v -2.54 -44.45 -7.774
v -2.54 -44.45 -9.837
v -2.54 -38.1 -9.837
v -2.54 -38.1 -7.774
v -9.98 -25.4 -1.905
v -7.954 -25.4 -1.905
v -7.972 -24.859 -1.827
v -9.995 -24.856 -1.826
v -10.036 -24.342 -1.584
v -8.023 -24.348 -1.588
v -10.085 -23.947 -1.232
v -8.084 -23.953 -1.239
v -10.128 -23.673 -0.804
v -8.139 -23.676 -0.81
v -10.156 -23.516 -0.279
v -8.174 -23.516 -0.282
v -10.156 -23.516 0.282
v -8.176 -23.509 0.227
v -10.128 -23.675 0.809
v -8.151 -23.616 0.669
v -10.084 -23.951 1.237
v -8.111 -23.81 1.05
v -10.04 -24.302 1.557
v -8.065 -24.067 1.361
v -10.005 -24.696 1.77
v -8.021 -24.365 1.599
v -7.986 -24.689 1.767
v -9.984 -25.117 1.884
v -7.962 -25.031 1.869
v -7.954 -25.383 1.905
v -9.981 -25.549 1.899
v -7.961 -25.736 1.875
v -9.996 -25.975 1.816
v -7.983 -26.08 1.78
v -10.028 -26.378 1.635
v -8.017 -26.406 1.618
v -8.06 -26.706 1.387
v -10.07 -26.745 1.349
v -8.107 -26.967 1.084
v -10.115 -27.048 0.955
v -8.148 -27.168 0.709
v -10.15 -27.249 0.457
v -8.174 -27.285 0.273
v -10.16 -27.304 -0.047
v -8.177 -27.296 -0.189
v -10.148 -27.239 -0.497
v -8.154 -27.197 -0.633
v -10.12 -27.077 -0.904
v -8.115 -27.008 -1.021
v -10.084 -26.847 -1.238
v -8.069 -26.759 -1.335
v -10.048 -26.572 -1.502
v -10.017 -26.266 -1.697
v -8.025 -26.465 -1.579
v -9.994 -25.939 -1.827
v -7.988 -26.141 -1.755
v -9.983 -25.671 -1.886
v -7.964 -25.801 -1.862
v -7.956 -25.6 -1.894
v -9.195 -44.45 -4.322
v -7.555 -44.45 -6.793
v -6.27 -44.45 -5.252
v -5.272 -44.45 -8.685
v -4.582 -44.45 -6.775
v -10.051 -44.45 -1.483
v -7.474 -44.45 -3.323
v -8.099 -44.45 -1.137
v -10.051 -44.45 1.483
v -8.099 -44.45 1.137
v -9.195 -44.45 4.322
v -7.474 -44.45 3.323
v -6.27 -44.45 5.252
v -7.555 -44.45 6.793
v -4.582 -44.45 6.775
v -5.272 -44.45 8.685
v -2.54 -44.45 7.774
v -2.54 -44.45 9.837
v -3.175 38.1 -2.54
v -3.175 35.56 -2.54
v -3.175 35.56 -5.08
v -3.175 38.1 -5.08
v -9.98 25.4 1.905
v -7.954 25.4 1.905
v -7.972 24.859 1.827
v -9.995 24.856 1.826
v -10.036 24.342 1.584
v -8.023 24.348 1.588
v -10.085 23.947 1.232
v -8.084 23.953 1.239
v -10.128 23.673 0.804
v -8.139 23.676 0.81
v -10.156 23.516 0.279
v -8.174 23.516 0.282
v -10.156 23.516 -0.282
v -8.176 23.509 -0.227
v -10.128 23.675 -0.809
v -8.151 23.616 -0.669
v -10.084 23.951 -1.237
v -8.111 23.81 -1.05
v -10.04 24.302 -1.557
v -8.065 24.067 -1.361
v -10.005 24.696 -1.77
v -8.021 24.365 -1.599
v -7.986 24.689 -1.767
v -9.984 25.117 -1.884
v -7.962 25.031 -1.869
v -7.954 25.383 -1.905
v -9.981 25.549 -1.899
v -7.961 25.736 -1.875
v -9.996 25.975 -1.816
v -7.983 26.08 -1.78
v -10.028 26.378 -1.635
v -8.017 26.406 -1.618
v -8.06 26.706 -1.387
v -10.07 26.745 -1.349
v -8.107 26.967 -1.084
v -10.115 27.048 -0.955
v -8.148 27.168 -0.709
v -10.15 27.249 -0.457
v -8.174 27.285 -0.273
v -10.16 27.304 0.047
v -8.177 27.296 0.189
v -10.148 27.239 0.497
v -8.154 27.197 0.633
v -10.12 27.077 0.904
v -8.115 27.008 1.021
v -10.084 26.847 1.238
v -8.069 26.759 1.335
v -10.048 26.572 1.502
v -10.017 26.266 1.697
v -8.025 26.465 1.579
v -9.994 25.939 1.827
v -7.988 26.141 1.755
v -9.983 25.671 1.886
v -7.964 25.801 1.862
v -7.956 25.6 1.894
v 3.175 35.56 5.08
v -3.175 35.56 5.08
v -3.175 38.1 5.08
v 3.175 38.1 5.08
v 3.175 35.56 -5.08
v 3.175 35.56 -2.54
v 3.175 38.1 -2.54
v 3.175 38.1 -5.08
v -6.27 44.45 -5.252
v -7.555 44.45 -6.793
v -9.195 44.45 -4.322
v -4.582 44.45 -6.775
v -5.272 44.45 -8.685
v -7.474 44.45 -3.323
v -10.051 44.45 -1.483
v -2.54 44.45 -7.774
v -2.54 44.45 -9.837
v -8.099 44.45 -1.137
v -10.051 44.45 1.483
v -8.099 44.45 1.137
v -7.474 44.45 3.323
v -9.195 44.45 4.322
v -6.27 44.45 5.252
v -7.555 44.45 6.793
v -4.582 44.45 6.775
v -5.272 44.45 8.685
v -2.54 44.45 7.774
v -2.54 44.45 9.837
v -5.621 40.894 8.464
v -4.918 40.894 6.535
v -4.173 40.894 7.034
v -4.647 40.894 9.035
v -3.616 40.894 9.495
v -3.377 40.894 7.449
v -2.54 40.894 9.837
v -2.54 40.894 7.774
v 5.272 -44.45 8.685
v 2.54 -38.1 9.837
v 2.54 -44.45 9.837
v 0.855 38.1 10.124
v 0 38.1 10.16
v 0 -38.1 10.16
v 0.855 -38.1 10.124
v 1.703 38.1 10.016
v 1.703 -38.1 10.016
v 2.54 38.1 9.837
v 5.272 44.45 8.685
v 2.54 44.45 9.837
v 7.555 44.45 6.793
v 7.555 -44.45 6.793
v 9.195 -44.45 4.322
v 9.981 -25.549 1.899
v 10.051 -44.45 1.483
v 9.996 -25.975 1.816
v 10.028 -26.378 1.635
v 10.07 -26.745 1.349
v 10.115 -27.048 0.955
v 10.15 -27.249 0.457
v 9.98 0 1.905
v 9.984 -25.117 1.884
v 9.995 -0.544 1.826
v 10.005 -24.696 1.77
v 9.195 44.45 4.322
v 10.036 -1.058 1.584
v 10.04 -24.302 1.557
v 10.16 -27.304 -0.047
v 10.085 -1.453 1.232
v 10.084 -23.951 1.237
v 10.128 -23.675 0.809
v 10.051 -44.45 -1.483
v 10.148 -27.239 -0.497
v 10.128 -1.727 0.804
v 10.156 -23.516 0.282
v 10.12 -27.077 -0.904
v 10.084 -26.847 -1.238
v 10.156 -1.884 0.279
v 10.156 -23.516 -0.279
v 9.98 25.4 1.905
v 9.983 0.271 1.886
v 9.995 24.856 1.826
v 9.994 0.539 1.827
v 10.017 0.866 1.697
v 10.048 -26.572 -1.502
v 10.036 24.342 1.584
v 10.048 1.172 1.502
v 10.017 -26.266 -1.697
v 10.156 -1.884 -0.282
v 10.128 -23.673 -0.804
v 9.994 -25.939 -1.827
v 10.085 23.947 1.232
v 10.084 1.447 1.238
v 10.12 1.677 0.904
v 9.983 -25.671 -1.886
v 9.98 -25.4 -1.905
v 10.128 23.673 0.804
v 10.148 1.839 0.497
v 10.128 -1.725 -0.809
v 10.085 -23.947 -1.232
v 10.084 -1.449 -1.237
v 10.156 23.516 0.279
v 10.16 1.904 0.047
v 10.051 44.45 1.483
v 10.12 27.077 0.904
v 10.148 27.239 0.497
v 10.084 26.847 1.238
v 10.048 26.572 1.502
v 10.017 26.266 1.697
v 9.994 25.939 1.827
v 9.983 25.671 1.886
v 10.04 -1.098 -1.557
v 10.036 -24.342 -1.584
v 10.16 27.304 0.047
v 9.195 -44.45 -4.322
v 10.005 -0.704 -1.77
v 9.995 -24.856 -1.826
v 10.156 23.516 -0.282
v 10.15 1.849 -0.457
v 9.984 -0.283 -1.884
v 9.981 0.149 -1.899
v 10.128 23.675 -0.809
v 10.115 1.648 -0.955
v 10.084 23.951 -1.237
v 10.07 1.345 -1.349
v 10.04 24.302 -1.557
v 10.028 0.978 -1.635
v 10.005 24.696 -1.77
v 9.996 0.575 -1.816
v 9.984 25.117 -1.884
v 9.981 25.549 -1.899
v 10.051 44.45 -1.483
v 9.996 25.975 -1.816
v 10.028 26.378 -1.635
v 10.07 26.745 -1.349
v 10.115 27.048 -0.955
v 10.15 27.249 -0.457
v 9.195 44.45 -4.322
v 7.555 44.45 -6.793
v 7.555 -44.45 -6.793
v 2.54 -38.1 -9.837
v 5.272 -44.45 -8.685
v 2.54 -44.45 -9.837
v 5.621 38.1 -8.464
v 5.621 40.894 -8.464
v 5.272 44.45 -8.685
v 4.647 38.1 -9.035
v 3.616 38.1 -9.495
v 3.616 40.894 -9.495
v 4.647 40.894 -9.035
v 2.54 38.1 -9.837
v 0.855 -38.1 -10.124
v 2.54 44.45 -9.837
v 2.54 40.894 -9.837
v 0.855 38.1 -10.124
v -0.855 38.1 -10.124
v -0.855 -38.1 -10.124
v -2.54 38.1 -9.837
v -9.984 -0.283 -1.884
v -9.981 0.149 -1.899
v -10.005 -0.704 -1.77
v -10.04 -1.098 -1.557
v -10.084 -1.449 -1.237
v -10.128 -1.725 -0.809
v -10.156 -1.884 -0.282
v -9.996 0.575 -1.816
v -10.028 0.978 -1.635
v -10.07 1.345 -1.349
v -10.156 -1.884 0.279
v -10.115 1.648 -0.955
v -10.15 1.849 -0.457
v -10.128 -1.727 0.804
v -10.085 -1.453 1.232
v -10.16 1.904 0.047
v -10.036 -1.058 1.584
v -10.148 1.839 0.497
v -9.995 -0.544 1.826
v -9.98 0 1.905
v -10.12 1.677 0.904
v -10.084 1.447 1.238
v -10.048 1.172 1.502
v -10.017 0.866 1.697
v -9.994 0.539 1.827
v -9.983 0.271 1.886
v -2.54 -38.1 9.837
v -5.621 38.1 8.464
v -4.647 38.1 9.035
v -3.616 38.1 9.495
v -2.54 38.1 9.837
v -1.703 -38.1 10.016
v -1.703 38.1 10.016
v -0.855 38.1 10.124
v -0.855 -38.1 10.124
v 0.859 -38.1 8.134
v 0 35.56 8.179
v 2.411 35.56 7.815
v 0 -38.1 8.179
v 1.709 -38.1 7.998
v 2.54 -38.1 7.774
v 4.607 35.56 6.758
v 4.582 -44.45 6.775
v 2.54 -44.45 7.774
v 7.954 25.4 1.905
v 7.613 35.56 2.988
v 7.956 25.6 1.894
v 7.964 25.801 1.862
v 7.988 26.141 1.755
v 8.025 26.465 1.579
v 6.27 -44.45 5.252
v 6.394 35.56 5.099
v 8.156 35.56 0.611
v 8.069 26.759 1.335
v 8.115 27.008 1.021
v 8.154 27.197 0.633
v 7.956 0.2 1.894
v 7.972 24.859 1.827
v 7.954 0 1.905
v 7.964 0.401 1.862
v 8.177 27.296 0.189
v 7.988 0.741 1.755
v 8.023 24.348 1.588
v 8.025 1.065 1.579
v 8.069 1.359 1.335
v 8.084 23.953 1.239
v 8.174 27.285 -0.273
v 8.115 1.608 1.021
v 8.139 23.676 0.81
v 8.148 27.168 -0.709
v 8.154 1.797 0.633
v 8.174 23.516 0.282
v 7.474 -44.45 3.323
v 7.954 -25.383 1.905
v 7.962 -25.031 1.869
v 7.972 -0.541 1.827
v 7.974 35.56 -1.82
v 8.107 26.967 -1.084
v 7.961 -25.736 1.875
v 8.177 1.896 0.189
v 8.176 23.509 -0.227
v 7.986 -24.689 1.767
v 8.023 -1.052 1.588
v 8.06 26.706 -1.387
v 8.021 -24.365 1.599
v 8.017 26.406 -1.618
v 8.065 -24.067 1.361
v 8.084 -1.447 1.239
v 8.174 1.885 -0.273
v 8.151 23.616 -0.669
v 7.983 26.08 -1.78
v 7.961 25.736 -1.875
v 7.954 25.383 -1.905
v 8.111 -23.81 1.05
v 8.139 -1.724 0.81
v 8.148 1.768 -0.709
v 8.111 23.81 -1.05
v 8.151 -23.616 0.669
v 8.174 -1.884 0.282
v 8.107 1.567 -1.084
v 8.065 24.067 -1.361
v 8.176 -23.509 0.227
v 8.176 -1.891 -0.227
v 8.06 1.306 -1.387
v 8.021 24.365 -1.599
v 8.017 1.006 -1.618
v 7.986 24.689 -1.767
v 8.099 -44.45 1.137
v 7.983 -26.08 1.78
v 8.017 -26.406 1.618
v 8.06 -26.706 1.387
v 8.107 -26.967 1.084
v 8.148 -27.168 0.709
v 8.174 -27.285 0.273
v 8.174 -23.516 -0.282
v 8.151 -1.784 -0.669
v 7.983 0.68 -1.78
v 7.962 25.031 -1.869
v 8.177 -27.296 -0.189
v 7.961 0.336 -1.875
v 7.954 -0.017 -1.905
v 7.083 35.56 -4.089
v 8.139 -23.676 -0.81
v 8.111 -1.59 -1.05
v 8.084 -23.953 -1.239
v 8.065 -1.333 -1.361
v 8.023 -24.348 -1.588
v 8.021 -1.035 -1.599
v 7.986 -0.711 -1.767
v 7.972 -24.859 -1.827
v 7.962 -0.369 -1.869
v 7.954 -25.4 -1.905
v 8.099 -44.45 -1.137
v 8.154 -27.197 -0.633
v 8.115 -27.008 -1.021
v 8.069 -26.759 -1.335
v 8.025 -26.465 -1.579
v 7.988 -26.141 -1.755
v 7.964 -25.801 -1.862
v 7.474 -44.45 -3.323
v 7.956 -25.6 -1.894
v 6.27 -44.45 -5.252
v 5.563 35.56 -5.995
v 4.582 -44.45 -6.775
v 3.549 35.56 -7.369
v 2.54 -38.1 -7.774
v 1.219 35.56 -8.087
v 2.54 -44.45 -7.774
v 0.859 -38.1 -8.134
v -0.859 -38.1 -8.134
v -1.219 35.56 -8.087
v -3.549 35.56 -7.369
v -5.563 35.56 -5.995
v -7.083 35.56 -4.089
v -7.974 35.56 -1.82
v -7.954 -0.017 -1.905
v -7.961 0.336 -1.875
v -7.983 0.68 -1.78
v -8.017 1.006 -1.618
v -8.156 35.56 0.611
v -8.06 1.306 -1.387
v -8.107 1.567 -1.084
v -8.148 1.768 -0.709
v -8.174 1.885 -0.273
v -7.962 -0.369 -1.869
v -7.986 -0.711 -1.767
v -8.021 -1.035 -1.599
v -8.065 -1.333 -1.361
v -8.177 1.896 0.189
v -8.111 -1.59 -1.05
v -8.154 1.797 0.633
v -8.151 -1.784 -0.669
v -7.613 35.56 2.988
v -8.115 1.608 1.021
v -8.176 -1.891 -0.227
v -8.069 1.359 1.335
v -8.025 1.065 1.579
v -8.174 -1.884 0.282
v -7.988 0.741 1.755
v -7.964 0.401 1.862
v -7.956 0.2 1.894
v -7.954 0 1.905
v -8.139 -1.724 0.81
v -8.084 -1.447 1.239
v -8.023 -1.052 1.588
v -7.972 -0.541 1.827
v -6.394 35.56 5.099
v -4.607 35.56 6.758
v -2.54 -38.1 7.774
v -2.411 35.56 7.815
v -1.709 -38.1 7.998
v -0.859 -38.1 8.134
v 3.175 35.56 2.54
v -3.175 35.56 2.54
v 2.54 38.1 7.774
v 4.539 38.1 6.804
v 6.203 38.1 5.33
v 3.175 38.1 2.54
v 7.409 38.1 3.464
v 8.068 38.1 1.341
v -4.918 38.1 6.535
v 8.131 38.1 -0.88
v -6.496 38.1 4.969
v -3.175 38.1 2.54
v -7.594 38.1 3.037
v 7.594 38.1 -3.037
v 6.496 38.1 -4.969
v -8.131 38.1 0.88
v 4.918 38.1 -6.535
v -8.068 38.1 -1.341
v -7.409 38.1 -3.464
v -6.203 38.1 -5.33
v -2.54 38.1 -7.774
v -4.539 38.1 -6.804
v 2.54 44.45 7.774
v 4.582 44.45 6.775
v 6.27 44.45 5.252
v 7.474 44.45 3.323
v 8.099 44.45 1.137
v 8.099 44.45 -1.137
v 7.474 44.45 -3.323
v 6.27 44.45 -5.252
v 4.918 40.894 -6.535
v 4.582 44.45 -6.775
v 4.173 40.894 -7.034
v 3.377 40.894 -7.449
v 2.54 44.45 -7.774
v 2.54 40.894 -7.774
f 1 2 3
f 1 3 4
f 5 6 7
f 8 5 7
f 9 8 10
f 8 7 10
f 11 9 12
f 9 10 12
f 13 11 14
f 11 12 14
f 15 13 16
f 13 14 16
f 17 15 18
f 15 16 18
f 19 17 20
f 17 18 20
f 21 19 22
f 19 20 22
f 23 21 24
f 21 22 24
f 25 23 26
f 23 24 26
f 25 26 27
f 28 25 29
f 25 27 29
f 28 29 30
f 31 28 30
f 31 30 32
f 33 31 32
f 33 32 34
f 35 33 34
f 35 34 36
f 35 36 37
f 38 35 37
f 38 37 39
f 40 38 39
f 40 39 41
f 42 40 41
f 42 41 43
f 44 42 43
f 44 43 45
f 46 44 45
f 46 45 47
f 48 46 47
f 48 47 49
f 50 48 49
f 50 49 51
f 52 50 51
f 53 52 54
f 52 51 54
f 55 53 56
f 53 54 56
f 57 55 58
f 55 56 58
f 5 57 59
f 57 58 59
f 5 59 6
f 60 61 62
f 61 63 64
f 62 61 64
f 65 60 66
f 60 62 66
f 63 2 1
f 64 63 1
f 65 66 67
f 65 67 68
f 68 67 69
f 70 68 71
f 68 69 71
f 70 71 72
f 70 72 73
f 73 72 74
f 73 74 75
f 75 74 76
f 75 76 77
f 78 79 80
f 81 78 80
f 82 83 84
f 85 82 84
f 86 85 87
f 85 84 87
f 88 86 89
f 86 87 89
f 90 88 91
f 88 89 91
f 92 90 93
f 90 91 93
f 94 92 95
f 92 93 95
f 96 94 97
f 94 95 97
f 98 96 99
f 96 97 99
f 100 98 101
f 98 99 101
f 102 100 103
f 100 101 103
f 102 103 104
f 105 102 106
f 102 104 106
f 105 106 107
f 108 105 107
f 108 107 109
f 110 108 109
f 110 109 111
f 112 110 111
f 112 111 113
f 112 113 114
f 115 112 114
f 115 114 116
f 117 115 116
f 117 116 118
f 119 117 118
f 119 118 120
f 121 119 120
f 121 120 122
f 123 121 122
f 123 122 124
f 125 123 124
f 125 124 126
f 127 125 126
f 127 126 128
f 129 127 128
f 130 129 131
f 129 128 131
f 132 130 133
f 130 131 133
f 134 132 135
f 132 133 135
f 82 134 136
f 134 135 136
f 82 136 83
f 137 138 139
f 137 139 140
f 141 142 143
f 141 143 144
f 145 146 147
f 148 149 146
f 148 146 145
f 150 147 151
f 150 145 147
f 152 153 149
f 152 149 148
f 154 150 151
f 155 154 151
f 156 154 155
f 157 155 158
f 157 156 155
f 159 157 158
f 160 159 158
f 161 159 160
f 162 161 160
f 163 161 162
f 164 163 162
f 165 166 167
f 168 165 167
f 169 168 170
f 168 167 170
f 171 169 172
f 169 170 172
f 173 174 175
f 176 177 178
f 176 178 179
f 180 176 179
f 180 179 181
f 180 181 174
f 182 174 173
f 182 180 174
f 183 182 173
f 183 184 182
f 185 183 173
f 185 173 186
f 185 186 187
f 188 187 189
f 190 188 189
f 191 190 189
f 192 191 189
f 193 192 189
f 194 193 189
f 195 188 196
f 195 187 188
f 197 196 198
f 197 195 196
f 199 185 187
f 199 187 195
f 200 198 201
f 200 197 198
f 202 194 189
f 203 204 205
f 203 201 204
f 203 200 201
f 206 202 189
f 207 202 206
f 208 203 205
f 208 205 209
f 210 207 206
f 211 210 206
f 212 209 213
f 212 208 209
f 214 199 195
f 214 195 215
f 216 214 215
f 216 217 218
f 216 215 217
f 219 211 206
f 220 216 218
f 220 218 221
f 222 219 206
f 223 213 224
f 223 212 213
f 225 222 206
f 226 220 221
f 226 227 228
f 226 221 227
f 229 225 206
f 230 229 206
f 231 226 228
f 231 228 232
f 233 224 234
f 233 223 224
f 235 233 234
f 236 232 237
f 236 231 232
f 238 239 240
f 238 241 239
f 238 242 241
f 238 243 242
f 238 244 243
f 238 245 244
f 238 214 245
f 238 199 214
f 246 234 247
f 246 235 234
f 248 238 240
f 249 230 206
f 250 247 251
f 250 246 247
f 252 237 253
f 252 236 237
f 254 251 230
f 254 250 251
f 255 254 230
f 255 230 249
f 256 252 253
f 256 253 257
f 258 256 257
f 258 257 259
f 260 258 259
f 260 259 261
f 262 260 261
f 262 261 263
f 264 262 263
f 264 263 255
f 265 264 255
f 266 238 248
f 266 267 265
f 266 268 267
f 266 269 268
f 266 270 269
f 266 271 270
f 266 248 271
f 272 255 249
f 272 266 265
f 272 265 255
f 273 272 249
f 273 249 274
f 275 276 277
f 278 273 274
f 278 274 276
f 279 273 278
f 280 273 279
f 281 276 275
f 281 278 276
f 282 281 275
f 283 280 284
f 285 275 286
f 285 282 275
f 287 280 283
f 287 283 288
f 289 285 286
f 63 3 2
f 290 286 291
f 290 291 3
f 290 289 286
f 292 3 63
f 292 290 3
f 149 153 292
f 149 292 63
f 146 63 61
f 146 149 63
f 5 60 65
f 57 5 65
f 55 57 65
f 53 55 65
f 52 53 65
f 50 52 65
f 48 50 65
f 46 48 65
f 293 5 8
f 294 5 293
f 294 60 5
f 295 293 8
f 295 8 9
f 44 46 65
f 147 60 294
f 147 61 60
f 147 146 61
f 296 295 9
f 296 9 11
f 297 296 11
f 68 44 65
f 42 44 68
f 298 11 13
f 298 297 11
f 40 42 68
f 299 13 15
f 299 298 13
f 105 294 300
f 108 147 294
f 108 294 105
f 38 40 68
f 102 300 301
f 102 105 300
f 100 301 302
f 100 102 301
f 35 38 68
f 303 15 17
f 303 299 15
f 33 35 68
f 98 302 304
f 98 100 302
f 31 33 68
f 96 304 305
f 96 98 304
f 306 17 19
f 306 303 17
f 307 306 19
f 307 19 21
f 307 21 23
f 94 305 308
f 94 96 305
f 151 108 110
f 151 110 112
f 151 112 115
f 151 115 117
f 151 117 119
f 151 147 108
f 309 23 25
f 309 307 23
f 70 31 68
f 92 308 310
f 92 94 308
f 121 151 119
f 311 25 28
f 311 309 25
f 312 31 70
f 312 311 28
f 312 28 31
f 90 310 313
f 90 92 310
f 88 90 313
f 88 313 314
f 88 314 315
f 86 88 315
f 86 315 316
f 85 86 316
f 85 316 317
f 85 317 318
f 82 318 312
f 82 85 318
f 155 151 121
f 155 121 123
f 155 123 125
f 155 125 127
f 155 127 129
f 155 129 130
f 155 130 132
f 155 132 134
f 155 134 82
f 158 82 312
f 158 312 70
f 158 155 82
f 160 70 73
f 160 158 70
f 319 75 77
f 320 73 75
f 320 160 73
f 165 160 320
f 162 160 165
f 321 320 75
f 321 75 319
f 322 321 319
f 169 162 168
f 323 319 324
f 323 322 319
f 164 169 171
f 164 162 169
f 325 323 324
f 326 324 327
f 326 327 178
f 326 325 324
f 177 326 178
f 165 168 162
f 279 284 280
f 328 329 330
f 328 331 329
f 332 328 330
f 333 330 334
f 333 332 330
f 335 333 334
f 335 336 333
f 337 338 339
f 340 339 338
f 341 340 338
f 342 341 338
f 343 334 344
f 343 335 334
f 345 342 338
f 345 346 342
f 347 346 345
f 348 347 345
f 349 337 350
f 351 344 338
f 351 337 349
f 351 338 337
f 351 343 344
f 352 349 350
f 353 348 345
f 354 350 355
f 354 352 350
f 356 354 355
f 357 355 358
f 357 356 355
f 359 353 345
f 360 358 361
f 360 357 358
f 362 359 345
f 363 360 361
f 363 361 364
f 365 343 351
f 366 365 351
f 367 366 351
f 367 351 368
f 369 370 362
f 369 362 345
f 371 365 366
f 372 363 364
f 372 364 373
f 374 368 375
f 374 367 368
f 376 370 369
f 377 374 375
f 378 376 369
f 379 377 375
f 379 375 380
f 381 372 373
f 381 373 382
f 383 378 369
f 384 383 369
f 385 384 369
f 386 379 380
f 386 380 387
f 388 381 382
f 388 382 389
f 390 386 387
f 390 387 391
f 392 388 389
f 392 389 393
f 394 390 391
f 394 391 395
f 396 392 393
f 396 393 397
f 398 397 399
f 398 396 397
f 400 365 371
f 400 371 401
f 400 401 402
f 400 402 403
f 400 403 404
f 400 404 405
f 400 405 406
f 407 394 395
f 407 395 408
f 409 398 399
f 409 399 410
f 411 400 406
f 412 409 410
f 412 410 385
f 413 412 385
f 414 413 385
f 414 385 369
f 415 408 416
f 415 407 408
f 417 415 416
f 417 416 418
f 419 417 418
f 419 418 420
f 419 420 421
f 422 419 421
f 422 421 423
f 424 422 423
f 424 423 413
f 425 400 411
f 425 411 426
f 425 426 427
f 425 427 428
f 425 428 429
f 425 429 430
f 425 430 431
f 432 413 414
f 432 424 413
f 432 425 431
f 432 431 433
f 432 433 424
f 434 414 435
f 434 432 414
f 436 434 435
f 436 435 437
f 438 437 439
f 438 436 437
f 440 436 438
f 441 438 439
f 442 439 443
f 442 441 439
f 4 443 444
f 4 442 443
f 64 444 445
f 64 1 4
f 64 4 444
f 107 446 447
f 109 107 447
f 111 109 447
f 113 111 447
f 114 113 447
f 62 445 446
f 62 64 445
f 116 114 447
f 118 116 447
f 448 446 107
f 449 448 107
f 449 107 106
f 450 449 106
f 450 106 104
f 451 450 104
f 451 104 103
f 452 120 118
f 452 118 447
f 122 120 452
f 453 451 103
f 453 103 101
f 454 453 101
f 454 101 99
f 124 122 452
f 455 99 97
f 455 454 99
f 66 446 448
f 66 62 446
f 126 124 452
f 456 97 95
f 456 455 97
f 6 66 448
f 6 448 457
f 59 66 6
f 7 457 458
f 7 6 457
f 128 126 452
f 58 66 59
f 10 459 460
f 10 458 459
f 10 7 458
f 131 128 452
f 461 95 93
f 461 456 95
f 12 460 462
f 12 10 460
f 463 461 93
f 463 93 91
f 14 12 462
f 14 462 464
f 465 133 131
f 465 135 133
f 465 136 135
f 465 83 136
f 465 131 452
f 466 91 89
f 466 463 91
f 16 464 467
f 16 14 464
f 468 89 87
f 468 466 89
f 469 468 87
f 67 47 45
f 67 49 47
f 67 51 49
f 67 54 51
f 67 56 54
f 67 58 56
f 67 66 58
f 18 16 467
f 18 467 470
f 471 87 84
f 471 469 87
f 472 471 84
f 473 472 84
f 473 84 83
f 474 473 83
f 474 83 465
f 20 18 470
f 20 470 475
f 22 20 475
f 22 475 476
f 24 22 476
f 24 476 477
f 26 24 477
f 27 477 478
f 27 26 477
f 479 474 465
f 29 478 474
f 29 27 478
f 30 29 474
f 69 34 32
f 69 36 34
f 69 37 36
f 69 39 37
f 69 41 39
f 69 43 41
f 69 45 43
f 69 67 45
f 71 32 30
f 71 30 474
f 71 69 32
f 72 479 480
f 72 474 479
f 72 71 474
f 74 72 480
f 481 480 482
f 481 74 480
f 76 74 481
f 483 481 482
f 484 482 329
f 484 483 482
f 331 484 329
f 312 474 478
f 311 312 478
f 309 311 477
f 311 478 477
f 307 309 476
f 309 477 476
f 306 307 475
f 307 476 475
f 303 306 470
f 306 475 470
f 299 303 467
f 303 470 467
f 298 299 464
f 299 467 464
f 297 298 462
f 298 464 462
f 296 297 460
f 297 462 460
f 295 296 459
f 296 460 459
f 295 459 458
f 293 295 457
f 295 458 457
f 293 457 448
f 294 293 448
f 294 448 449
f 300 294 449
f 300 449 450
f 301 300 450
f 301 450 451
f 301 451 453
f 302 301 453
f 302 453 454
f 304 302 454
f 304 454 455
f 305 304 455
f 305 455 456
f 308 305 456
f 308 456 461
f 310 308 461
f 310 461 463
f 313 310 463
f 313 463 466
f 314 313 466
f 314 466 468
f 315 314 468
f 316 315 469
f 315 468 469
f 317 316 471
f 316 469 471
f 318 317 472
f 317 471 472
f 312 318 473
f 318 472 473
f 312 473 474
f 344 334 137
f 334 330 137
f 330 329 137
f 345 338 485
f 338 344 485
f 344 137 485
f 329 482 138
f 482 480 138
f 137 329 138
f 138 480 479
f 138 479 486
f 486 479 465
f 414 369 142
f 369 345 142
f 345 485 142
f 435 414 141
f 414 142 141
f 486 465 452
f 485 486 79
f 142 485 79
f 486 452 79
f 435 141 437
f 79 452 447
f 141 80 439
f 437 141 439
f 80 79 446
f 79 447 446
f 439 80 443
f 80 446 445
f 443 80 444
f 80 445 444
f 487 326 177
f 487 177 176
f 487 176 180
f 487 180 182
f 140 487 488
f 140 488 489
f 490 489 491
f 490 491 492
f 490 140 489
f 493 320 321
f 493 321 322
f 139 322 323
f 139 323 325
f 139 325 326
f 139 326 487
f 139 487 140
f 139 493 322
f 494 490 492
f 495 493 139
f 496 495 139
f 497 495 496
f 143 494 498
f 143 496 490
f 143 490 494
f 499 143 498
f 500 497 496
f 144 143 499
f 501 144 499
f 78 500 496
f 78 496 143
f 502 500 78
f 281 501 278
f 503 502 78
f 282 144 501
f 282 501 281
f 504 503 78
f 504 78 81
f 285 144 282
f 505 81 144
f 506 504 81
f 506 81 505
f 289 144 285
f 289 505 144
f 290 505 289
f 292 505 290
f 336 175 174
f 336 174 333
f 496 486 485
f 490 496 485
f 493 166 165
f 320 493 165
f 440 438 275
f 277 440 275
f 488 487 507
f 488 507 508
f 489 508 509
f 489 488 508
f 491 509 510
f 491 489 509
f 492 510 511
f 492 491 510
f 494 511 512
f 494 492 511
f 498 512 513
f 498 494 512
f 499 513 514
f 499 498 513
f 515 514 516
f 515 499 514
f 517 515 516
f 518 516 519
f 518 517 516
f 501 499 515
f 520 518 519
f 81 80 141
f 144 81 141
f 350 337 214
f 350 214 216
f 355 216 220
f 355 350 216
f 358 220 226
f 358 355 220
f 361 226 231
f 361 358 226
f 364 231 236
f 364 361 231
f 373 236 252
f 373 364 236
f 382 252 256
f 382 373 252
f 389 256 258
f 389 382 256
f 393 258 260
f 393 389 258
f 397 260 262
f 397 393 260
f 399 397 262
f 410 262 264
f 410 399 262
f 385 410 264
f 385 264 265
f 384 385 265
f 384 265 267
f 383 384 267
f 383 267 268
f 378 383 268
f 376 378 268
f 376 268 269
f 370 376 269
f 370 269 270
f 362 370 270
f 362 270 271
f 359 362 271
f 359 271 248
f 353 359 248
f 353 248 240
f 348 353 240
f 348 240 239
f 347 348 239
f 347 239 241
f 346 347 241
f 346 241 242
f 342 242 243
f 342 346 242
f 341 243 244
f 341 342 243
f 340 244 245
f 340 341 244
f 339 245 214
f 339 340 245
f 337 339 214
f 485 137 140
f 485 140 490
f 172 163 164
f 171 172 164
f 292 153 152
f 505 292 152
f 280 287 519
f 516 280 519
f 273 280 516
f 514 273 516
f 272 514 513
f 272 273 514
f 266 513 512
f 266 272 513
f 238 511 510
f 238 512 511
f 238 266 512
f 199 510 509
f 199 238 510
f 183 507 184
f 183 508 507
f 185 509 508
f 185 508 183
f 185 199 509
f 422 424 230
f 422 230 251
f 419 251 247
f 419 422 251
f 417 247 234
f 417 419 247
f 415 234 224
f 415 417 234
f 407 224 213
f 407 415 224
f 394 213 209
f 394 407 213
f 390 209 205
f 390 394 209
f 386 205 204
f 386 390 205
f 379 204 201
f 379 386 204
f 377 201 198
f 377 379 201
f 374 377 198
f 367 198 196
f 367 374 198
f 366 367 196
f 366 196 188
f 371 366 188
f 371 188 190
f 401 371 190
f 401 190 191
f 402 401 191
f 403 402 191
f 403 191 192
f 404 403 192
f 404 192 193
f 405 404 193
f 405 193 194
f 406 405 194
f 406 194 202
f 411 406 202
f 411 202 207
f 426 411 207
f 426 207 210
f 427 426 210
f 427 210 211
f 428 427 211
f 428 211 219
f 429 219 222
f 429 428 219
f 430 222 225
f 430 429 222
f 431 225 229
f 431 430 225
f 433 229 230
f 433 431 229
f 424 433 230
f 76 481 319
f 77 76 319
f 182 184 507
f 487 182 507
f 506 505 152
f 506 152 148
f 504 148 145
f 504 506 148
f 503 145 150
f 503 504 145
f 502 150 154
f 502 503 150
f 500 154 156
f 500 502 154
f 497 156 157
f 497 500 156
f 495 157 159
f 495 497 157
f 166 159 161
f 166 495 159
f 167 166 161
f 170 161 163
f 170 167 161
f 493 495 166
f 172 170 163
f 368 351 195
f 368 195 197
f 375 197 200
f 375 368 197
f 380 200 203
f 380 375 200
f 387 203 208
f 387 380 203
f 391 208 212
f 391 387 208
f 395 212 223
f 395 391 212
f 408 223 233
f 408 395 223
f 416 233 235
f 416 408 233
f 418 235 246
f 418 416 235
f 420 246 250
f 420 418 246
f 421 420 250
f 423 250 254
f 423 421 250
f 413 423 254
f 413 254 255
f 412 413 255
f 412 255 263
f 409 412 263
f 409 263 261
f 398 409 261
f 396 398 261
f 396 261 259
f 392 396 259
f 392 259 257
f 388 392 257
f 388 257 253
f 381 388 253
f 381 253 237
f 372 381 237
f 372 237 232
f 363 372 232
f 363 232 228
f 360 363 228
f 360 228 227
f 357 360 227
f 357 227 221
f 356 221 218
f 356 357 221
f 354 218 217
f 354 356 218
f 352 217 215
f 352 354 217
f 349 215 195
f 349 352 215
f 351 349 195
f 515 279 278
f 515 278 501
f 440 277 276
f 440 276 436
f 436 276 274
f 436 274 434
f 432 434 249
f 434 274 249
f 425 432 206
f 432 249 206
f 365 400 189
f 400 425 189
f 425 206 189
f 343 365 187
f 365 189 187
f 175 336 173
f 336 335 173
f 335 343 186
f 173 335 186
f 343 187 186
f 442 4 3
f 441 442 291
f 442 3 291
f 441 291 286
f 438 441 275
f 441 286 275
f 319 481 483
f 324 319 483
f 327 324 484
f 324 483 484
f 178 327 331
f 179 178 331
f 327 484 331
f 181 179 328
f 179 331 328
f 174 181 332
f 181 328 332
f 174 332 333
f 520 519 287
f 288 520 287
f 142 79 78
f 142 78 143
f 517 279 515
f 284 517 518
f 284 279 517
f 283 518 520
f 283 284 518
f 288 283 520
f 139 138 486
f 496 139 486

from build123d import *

# Parameters (mm, degrees)
SKETCH2_R                      = 10.16
SKETCH2_R_2                    = 8.1788
BOSS_EXTRUDE2_DEPTH            = 44.45
CUT_EXTRUDE1_DEPTH             = 6.35
CUT_EXTRUDE3_REACH             = 48.715
SKETCH5_R                      = 1.905
CUT_EXTRUDE3_DIRECTION_2_DEPTH = 13.97
CUT_EXTRUDE4_START             = -3.556
CUT_EXTRUDE4_DEPTH             = 2.794
BOSS_EXTRUDE3_START            = -2.54
SKETCH7_R                      = 8.1788
SKETCH7_W                      = 6.35
SKETCH7_H                      = 2.54
BOSS_EXTRUDE3_DEPTH            = 2.54


with BuildPart() as part:
    # Sketch2 → Boss-Extrude2 (new, symmetric)
    with BuildSketch(Plane(origin=(0, 0, 0), x_dir=(1, 0, 0), z_dir=(0, 1, 0))):
        with Locations(Location((0, 0, 0), (0, 0, 270))):
            Circle(SKETCH2_R)
        with Locations(Location((0, 0, 0), (0, 0, 270))):
            Circle(SKETCH2_R_2, mode=Mode.SUBTRACT)
    extrude(amount=BOSS_EXTRUDE2_DEPTH, both=True)

    # Sketch4 → Cut-Extrude1 (cut)
    with BuildSketch(Plane(origin=(0, 44.45, 0), x_dir=(1, 0, 0), z_dir=(0, 1, 0))):
        with BuildLine():
            Line((-2.54, 9.837377699), (-2.54, -9.837377699))
            ThreePointArc((-2.54, -9.837377699), (0, -10.16), (2.54, -9.837377699))
            Line((2.54, -9.837377699), (2.54, 9.837377699))
            ThreePointArc((2.54, 9.837377699), (0, 10.16), (-2.54, 9.837377699))
        make_face()
    cut_extrude1 = extrude(amount=-CUT_EXTRUDE1_DEPTH, mode=Mode.SUBTRACT)

    # Mirror1: Cut-Extrude1 across plane
    add(cut_extrude1.mirror(Plane.ZX), mode=Mode.SUBTRACT)

    # Sketch5 → Cut-Extrude3 (cut, up to next)
    with BuildSketch(Plane(origin=(0, 0, 0), x_dir=(0, 0, -1), z_dir=(1, 0, 0)), mode=Mode.PRIVATE) as cut_extrude3_sk1:
        with Locations(Location((0, 0, 0), (0, 0, 180))):
            Circle(SKETCH5_R)
    cut_extrude3_tool1 = extrude(cut_extrude3_sk1.sketch, amount=-CUT_EXTRUDE3_REACH, mode=Mode.PRIVATE) & part.part
    # Sketch5 → Cut-Extrude3 (cut, up to next)
    with BuildSketch(Plane(origin=(0, 0, 0), x_dir=(0, 0, -1), z_dir=(1, 0, 0)), mode=Mode.PRIVATE) as cut_extrude3_sk2:
        with Locations(Location((0, 25.4, 0), (0, 0, 180))):
            Circle(SKETCH5_R)
    cut_extrude3_tool2 = extrude(cut_extrude3_sk2.sketch, amount=-CUT_EXTRUDE3_REACH, mode=Mode.PRIVATE) & part.part
    # Sketch5 → Cut-Extrude3 (cut, up to next)
    with BuildSketch(Plane(origin=(0, 0, 0), x_dir=(0, 0, -1), z_dir=(1, 0, 0)), mode=Mode.PRIVATE) as cut_extrude3_sk3:
        with Locations((0, -25.4)):
            Circle(SKETCH5_R)
    cut_extrude3_tool3 = extrude(cut_extrude3_sk3.sketch, amount=-CUT_EXTRUDE3_REACH, mode=Mode.PRIVATE) & part.part
    add(cut_extrude3_tool1.solids().sort_by_distance((0, 0, 0))[0], mode=Mode.SUBTRACT)
    add(cut_extrude3_tool2.solids().sort_by_distance((0, 25.4, 0))[0], mode=Mode.SUBTRACT)
    add(cut_extrude3_tool3.solids().sort_by_distance((0, -25.4, 0))[0], mode=Mode.SUBTRACT)

    # Sketch5 → Cut-Extrude3 direction 2 (cut)
    with BuildSketch(Plane(origin=(0, 0, 0), x_dir=(0, 0, -1), z_dir=(1, 0, 0))):
        with Locations(Location((0, 0, 0), (0, 0, 180))):
            Circle(SKETCH5_R)
        with Locations(Location((0, 25.4, 0), (0, 0, 180))):
            Circle(SKETCH5_R)
        with Locations((0, -25.4)):
            Circle(SKETCH5_R)
    extrude(amount=CUT_EXTRUDE3_DIRECTION_2_DEPTH, mode=Mode.SUBTRACT)

    # Sketch6 → Cut-Extrude4 (cut)
    with BuildSketch(Plane(origin=(0, 44.45, 0), x_dir=(1, 0, 0), z_dir=(0, 1, 0)).offset(CUT_EXTRUDE4_START)):
        with BuildLine():
            Line((-4.918424262, -6.534666955), (-5.62055167, -8.463746152))
            ThreePointArc((-5.62055167, -8.463746152), (-4.137676497, -9.279290555), (-2.54, -9.837377699))
            Line((-2.54, -9.837377699), (-2.54, -7.774391902))
            ThreePointArc((-2.54, -7.774391902), (-3.78037731, -7.252690317), (-4.918424262, -6.534666955))
        make_face()
        with BuildLine():
            Line((2.54, 7.774391902), (2.54, 9.837377699))
            ThreePointArc((2.54, 9.837377699), (4.137676497, 9.279290555), (5.62055167, 8.463746152))
            Line((5.62055167, 8.463746152), (4.918424262, 6.534666955))
            ThreePointArc((4.918424262, 6.534666955), (3.78037731, 7.252690317), (2.54, 7.774391902))
        make_face()
    extrude(amount=-CUT_EXTRUDE4_DEPTH, mode=Mode.SUBTRACT)

    # Sketch7 → Boss-Extrude3 (add)
    with BuildSketch(Plane(origin=(0, 38.1, 0), x_dir=(1, 0, 0), z_dir=(0, 1, 0)).offset(BOSS_EXTRUDE3_START)):
        with Locations(Location((0, 0, 0), (0, 0, 71.907077979))):
            Circle(SKETCH7_R)
        with Locations((0, 3.81)):
            Rectangle(SKETCH7_W, SKETCH7_H, mode=Mode.SUBTRACT)
        with Locations((0, -3.81)):
            Rectangle(SKETCH7_W, SKETCH7_H, mode=Mode.SUBTRACT)
    extrude(amount=BOSS_EXTRUDE3_DEPTH)


solid = part.part
